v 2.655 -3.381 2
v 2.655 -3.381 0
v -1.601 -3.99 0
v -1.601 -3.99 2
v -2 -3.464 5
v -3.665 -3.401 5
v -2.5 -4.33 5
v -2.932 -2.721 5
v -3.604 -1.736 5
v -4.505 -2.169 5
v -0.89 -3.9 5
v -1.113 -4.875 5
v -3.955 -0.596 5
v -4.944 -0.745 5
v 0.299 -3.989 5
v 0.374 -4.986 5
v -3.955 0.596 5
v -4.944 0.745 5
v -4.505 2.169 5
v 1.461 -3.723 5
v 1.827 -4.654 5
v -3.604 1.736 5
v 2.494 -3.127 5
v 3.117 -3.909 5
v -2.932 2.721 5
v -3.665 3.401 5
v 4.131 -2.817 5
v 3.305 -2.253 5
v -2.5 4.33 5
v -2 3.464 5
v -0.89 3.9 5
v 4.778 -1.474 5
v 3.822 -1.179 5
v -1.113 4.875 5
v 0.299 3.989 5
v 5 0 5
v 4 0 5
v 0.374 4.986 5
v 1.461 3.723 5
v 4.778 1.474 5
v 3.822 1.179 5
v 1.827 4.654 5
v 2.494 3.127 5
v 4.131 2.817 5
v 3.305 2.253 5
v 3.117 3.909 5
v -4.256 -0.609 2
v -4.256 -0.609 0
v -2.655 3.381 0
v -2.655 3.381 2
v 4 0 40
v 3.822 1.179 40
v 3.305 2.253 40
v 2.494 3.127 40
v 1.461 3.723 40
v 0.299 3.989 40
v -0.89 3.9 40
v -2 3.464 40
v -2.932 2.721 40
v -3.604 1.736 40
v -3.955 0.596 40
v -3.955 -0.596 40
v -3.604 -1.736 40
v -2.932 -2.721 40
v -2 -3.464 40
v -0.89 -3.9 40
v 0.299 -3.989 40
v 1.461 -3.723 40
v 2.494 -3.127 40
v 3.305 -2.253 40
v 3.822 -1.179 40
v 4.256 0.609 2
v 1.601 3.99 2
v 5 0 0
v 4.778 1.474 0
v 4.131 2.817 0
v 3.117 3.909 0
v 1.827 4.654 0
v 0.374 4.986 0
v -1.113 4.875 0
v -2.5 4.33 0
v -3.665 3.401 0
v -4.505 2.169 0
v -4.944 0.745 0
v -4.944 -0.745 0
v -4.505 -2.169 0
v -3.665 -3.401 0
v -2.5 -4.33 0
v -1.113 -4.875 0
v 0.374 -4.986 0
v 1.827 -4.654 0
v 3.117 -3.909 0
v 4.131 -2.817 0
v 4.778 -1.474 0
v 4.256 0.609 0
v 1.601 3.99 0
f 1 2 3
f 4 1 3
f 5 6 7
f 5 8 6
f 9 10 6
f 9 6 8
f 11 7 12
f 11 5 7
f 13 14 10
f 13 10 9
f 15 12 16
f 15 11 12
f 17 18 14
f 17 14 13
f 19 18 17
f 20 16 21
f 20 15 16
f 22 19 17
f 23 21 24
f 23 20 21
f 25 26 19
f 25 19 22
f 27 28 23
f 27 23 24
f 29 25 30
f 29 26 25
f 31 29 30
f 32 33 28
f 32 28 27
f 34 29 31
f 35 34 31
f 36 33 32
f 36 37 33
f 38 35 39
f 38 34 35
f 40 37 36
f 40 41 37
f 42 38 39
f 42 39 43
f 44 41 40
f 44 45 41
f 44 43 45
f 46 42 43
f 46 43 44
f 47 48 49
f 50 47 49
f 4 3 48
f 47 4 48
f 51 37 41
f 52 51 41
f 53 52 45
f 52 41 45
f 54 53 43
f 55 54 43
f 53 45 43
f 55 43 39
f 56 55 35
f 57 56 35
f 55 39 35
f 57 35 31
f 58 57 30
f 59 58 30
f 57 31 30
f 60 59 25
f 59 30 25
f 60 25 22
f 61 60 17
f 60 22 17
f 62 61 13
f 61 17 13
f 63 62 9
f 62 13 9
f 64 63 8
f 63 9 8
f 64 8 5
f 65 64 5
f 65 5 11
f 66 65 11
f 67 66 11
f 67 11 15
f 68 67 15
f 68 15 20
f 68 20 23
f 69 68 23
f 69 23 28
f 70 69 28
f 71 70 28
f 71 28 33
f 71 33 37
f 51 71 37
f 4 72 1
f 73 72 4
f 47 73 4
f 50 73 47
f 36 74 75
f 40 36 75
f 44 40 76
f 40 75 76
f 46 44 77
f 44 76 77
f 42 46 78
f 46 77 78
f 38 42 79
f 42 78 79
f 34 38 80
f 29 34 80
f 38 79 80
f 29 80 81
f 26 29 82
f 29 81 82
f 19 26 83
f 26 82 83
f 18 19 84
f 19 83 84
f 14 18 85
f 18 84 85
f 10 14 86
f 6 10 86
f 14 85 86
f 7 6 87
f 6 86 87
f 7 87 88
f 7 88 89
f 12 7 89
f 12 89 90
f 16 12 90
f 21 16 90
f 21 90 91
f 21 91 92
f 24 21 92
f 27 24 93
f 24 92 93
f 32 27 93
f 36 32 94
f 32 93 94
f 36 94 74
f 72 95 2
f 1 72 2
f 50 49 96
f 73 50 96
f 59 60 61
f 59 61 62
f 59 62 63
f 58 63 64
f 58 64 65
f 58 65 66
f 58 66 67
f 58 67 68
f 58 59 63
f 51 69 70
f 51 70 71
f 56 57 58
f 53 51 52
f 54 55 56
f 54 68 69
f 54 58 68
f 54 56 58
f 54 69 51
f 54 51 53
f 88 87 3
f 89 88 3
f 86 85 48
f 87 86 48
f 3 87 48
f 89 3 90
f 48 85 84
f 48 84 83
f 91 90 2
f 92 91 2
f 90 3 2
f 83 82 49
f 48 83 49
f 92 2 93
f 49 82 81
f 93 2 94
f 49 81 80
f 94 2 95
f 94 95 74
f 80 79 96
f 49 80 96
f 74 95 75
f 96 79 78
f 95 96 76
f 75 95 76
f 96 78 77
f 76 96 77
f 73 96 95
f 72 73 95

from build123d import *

# Parameters (mm, degrees)
SKETCH1_R           = 4
BOSS_EXTRUDE1_DEPTH = 40
SKETCH1_5_R         = 5
SKETCH1_5_R_2       = 4
BOSS_EXTRUDE2_DEPTH = 5
CUT_EXTRUDE3_DEPTH  = 1
CUT_EXTRUDE4_DEPTH  = 2


with BuildPart() as part:
    # Sketch1 → Boss-Extrude1 (new body)
    with BuildSketch(Plane.XY):
        Circle(SKETCH1_R)
    extrude(amount=BOSS_EXTRUDE1_DEPTH)

    # Sketch1<5> → Boss-Extrude2 (add)
    with BuildSketch(Plane.XY):
        Circle(SKETCH1_5_R)
        Circle(SKETCH1_5_R_2, mode=Mode.SUBTRACT)
    extrude(amount=BOSS_EXTRUDE2_DEPTH)

    # Sketch2 → Cut-Extrude3 (cut)
    with BuildSketch(Plane(origin=(0, 0, 0), x_dir=(-1, 0, 0), z_dir=(0, 0, -1))):
        Polygon((-1.600773397, 3.989869624), (-4.255715151, 0.608624385), (-2.654941754, -3.38124524), (1.600773397, -3.989869624), (4.255715151, -0.608624385), (2.654941754, 3.38124524), align=None)
    extrude(amount=-CUT_EXTRUDE3_DEPTH, mode=Mode.SUBTRACT)

    # Sketch2<2> → Cut-Extrude4 (cut)
    with BuildSketch(Plane(origin=(0, 0, 0), x_dir=(-1, 0, 0), z_dir=(0, 0, -1))):
        Polygon((-1.600773397, 3.989869624), (-4.255715151, 0.608624385), (-2.654941754, -3.38124524), (1.600773397, -3.989869624), (4.255715151, -0.608624385), (2.654941754, 3.38124524), align=None)
    extrude(amount=-CUT_EXTRUDE4_DEPTH, mode=Mode.SUBTRACT)


solid = part.part
